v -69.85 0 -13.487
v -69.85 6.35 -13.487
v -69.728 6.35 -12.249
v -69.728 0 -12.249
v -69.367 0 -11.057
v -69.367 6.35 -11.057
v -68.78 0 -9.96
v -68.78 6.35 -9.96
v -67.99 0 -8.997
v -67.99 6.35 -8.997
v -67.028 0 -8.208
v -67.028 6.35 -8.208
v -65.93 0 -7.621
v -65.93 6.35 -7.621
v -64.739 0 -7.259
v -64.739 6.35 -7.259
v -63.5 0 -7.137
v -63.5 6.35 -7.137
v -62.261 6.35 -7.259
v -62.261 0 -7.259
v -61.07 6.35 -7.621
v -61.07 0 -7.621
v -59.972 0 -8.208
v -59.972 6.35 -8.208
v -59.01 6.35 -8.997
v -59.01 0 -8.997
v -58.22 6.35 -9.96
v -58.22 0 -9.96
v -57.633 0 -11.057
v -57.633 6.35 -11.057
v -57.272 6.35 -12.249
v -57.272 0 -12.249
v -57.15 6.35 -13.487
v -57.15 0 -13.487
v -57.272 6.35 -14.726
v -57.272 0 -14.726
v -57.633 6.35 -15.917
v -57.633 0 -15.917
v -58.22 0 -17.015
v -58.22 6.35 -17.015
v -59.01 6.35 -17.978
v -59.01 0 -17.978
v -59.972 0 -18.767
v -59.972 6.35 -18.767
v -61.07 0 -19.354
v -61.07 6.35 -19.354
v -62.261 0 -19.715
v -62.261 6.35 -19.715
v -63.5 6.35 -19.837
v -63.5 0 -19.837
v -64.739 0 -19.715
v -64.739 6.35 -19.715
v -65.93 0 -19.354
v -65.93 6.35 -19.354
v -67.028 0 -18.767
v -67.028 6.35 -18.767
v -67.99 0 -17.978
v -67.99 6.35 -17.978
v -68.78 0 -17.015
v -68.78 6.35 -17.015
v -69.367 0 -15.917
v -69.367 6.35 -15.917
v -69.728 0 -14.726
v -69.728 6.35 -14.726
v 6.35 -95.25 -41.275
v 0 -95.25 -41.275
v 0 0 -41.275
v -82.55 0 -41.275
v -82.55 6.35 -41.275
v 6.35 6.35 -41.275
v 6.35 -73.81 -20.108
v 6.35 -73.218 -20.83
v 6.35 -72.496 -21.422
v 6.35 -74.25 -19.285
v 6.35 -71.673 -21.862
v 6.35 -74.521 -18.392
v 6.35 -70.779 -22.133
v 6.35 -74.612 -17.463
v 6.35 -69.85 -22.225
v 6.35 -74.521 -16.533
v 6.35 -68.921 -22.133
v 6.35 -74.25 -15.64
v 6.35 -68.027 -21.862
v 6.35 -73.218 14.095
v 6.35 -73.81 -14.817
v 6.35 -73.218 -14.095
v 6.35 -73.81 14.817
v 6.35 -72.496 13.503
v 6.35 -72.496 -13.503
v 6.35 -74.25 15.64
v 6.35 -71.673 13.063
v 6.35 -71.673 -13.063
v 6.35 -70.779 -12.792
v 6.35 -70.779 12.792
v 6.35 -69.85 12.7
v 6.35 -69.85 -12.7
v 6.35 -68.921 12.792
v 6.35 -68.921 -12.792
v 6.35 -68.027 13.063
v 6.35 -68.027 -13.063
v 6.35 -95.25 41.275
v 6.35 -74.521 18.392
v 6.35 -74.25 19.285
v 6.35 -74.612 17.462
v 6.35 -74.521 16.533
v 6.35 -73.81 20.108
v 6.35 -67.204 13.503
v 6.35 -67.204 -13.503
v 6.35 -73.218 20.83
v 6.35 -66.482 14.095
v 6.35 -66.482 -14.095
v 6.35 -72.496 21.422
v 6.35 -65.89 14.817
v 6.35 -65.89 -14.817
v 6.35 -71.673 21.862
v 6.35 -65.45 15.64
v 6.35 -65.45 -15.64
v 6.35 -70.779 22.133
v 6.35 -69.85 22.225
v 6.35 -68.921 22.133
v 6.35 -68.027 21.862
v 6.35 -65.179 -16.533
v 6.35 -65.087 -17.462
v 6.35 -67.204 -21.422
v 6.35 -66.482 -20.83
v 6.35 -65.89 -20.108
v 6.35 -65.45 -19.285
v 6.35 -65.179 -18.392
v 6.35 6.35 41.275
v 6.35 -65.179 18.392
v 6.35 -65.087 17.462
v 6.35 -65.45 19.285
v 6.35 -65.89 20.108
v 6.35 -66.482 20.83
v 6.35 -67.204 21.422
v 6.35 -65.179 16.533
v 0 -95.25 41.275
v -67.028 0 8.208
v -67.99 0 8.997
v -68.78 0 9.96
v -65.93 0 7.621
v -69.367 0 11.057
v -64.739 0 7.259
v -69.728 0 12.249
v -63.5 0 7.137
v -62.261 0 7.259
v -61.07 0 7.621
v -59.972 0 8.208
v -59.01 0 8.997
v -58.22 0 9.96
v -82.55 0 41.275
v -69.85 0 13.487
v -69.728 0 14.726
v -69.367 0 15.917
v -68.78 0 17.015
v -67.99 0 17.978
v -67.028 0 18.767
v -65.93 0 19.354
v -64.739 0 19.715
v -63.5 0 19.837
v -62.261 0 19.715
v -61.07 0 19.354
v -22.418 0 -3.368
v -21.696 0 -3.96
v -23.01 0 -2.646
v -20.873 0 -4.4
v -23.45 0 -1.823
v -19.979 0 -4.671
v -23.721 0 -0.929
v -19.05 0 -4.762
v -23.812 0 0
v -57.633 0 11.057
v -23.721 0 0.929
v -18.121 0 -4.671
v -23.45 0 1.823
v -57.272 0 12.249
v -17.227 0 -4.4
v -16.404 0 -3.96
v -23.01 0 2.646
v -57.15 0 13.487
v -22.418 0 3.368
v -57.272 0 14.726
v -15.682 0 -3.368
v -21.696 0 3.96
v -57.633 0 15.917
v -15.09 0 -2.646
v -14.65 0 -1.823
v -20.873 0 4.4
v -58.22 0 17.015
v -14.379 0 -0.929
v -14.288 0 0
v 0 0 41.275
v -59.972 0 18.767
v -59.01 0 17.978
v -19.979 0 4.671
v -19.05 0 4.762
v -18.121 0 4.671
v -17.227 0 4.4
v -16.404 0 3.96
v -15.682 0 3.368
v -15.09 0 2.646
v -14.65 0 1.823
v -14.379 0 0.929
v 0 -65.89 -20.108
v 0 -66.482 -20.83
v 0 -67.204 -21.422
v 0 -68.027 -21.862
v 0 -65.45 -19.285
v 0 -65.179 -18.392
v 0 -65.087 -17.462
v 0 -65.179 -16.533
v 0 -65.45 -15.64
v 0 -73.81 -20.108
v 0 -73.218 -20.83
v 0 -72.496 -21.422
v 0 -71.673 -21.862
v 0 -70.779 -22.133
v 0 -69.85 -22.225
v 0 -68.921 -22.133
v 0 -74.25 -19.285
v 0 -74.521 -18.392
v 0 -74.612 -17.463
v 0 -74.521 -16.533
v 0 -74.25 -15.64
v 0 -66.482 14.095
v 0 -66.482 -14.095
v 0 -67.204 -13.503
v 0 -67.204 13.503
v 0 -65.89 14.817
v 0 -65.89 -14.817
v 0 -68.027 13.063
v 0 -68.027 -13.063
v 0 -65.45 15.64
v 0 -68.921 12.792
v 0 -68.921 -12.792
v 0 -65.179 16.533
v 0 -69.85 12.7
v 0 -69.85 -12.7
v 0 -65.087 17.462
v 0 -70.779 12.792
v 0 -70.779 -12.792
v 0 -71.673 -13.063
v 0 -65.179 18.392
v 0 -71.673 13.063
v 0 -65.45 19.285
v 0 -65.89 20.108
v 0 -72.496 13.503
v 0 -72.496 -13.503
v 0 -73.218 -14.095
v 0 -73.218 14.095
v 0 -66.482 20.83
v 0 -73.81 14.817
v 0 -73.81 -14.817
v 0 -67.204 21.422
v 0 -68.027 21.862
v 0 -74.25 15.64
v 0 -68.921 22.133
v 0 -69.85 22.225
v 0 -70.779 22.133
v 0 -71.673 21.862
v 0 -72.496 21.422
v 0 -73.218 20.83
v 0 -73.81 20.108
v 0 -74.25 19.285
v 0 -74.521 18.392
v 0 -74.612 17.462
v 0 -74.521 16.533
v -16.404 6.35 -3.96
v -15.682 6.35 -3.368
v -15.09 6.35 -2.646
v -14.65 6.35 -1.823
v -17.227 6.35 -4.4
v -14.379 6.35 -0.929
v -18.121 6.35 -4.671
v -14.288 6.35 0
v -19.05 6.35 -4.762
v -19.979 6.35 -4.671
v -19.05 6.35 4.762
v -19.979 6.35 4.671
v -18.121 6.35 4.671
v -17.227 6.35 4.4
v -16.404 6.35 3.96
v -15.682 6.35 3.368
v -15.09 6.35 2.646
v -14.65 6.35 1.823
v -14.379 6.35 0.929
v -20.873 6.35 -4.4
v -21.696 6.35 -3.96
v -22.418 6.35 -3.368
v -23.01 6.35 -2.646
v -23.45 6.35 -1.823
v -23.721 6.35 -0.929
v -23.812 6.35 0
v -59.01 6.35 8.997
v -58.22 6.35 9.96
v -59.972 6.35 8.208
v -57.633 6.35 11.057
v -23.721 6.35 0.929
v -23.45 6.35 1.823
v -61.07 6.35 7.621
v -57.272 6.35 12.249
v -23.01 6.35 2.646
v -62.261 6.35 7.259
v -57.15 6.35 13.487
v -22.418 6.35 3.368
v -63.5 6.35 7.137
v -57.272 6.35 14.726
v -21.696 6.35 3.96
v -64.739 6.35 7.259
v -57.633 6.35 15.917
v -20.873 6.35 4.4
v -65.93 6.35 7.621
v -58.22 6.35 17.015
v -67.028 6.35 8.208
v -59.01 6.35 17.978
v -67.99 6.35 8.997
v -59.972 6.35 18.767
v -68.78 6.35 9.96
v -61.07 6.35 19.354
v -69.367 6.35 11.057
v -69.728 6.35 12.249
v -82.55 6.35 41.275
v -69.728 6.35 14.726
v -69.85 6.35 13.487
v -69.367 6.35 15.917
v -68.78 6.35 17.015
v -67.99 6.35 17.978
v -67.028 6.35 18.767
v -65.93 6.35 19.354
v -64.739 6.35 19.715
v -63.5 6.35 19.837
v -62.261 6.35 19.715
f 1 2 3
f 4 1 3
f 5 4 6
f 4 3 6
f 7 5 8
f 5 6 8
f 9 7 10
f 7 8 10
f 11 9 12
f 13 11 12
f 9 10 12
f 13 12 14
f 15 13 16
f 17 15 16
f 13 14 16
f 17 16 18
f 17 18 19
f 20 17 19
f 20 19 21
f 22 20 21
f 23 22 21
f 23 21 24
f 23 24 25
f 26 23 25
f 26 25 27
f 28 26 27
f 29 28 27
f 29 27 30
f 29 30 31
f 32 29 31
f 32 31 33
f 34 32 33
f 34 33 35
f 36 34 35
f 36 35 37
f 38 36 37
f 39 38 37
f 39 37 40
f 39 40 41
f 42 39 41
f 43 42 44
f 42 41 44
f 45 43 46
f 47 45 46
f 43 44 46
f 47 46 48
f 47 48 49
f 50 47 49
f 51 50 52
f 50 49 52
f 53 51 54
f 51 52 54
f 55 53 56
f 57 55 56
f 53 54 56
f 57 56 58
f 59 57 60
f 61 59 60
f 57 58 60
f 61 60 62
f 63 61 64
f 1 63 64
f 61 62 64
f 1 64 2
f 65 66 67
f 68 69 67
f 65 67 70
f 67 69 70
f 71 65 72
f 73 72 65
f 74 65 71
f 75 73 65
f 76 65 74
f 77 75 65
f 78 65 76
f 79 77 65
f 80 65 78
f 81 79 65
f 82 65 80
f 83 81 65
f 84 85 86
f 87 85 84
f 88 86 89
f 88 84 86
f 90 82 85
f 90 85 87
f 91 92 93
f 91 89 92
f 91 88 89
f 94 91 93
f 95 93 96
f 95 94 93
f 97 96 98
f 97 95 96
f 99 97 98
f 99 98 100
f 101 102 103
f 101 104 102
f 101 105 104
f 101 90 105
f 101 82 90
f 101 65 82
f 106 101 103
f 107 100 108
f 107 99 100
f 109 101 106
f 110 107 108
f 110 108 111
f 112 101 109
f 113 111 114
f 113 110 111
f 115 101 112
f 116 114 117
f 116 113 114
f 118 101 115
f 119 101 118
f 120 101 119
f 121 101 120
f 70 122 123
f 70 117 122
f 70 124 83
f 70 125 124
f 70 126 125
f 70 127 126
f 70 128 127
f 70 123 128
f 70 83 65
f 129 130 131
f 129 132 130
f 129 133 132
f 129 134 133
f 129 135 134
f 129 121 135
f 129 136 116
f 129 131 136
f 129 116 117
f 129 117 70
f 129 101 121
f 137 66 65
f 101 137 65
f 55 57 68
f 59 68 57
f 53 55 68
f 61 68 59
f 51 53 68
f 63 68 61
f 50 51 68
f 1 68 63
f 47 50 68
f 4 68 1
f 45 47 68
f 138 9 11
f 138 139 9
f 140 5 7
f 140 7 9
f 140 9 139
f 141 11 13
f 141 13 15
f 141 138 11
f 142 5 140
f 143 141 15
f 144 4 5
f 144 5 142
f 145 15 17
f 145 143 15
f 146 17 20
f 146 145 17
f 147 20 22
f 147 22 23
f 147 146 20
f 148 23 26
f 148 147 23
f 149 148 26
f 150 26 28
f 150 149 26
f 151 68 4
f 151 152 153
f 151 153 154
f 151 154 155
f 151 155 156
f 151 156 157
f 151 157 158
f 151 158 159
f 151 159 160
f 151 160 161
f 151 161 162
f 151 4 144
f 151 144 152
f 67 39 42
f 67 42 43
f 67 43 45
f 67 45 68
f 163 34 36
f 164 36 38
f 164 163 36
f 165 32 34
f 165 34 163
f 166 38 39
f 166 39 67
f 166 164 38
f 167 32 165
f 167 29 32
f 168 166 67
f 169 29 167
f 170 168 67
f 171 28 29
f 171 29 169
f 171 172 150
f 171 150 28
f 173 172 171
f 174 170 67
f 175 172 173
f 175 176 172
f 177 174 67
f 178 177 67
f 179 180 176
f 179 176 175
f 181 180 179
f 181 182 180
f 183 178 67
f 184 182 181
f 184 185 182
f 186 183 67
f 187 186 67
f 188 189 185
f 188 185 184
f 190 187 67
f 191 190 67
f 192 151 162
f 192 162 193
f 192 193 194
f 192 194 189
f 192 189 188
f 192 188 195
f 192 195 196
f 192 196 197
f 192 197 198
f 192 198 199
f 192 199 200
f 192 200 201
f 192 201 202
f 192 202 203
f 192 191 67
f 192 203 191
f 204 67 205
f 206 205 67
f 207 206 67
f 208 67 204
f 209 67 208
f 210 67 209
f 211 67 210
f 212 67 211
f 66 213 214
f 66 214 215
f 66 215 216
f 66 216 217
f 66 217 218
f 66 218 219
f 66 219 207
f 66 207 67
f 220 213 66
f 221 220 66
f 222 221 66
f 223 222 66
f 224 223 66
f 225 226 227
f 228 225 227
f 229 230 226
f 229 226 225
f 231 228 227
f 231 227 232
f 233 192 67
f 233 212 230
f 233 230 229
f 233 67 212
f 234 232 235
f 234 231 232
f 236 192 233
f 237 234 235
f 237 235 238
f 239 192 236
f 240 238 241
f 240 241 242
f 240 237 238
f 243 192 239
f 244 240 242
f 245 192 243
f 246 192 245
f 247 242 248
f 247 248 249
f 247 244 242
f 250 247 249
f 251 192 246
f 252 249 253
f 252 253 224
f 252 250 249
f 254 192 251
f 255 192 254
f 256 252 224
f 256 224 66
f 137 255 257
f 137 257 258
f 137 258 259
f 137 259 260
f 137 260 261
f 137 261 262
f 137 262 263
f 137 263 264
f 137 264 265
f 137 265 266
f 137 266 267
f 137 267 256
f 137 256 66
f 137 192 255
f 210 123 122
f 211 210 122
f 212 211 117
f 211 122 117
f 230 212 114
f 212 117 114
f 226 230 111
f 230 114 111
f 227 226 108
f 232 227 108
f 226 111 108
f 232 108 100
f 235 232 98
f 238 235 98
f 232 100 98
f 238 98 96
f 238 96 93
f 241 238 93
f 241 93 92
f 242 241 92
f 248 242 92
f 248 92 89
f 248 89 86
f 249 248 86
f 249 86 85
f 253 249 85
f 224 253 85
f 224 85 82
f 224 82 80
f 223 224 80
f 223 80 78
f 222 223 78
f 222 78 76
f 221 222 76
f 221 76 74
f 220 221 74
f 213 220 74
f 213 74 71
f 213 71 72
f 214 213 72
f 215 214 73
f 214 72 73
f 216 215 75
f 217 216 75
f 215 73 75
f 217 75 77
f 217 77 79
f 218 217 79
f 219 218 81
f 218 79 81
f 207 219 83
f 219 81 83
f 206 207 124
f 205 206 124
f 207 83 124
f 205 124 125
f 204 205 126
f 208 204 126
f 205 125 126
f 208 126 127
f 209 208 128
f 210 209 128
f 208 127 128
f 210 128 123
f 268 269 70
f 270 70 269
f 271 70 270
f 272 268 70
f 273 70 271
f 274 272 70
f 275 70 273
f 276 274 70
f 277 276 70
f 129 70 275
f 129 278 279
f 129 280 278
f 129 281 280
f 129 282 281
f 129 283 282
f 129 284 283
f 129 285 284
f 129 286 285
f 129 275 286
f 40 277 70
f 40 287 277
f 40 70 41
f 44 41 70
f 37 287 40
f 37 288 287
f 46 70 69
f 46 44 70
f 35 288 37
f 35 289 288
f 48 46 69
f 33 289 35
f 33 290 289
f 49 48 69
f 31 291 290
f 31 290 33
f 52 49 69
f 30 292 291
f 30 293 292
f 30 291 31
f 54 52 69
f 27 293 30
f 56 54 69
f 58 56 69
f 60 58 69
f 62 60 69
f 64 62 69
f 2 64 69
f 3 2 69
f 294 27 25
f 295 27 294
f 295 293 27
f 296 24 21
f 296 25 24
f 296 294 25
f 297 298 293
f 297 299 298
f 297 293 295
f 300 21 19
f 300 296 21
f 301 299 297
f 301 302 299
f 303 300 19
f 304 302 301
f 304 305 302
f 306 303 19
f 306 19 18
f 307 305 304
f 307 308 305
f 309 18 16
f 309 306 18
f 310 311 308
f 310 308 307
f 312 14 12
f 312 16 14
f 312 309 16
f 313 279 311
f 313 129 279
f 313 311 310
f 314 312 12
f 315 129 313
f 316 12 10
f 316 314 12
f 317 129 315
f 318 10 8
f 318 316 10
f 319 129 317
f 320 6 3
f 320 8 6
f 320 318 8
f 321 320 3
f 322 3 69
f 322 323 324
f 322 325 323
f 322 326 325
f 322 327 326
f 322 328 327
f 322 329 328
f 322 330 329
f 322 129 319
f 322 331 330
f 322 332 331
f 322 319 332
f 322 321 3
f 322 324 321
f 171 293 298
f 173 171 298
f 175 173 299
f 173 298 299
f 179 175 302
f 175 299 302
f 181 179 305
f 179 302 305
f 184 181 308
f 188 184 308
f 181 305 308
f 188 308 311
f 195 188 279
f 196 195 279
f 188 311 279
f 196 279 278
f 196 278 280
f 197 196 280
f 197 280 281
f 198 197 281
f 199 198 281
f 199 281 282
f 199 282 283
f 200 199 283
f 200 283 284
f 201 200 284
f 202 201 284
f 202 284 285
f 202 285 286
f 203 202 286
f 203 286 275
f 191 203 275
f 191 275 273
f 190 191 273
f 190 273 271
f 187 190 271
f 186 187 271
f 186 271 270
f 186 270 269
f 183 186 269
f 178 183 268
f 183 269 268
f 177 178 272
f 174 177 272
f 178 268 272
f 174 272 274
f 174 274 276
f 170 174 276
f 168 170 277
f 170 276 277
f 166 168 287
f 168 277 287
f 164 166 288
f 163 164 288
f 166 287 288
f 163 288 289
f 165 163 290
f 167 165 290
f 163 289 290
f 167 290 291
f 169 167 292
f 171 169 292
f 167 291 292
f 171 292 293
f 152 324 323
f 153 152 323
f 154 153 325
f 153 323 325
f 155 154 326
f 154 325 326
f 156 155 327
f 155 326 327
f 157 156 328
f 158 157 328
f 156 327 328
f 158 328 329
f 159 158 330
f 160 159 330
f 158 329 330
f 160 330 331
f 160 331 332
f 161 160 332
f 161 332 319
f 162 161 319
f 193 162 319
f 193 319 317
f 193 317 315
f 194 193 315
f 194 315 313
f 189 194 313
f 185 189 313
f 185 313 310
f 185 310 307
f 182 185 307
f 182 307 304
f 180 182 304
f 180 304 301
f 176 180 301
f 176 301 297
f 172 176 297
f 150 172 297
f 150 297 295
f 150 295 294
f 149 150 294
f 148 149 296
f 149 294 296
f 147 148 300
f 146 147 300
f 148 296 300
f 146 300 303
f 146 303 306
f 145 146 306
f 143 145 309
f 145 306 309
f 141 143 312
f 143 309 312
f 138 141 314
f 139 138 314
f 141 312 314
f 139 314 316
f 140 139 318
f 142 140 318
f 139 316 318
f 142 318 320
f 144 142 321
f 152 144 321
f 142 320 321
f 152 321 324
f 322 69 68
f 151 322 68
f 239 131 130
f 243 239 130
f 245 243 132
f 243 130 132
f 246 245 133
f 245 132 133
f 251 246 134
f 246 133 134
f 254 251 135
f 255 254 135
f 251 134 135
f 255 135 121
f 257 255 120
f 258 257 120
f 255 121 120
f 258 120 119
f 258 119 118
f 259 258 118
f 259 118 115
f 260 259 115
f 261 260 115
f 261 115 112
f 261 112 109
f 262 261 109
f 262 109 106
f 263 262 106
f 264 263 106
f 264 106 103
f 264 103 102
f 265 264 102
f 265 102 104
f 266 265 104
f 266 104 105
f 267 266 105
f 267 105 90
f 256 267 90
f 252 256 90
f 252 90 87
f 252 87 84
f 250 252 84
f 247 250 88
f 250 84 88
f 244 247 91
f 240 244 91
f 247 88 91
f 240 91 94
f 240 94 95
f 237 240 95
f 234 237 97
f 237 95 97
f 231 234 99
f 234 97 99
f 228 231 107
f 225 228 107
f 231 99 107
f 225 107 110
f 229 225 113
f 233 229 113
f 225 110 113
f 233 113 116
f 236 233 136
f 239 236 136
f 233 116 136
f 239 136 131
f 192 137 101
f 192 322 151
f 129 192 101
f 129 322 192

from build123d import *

# Parameters (mm, degrees)
F1_DEPTH = 41.275
F2_R     = 4.7625
F3_DEPTH = 88.901
F4_R     = 6.35
F4_R_2   = 4.7625
F5_DEPTH = 101.601


with BuildPart() as f1:
    # F0 (on Top) → F1 (new body, symmetric)
    with BuildSketch(Plane.XY):
        Polygon((-82.55, 0), (0, 0), (0, -95.25), (6.35, -95.25), (6.35, 6.35), (-82.55, 6.35), align=None)
    extrude(amount=F1_DEPTH, both=True)

    # F2 (on face) → F3 (cut, through all)
    with BuildSketch(Plane.YZ.offset(6.35)):
        with Locations((-69.85, 17.4625)):
            Circle(F2_R)
        with Locations((-69.85, -17.4625)):
            Circle(F2_R)
    extrude(amount=-F3_DEPTH, mode=Mode.SUBTRACT)

    # F4 (on face) → F5 (cut, through all)
    with BuildSketch(Plane(origin=(0, 6.35, 0), x_dir=(-1, 0, 0), z_dir=(0, 1, 0))):
        with Locations((63.5, 13.4874)):
            Circle(F4_R)
        with Locations((63.5, -13.4874)):
            Circle(F4_R)
        with Locations((19.05, 0)):
            Circle(F4_R_2)
    extrude(amount=-F5_DEPTH, mode=Mode.SUBTRACT)


solid = f1.part
